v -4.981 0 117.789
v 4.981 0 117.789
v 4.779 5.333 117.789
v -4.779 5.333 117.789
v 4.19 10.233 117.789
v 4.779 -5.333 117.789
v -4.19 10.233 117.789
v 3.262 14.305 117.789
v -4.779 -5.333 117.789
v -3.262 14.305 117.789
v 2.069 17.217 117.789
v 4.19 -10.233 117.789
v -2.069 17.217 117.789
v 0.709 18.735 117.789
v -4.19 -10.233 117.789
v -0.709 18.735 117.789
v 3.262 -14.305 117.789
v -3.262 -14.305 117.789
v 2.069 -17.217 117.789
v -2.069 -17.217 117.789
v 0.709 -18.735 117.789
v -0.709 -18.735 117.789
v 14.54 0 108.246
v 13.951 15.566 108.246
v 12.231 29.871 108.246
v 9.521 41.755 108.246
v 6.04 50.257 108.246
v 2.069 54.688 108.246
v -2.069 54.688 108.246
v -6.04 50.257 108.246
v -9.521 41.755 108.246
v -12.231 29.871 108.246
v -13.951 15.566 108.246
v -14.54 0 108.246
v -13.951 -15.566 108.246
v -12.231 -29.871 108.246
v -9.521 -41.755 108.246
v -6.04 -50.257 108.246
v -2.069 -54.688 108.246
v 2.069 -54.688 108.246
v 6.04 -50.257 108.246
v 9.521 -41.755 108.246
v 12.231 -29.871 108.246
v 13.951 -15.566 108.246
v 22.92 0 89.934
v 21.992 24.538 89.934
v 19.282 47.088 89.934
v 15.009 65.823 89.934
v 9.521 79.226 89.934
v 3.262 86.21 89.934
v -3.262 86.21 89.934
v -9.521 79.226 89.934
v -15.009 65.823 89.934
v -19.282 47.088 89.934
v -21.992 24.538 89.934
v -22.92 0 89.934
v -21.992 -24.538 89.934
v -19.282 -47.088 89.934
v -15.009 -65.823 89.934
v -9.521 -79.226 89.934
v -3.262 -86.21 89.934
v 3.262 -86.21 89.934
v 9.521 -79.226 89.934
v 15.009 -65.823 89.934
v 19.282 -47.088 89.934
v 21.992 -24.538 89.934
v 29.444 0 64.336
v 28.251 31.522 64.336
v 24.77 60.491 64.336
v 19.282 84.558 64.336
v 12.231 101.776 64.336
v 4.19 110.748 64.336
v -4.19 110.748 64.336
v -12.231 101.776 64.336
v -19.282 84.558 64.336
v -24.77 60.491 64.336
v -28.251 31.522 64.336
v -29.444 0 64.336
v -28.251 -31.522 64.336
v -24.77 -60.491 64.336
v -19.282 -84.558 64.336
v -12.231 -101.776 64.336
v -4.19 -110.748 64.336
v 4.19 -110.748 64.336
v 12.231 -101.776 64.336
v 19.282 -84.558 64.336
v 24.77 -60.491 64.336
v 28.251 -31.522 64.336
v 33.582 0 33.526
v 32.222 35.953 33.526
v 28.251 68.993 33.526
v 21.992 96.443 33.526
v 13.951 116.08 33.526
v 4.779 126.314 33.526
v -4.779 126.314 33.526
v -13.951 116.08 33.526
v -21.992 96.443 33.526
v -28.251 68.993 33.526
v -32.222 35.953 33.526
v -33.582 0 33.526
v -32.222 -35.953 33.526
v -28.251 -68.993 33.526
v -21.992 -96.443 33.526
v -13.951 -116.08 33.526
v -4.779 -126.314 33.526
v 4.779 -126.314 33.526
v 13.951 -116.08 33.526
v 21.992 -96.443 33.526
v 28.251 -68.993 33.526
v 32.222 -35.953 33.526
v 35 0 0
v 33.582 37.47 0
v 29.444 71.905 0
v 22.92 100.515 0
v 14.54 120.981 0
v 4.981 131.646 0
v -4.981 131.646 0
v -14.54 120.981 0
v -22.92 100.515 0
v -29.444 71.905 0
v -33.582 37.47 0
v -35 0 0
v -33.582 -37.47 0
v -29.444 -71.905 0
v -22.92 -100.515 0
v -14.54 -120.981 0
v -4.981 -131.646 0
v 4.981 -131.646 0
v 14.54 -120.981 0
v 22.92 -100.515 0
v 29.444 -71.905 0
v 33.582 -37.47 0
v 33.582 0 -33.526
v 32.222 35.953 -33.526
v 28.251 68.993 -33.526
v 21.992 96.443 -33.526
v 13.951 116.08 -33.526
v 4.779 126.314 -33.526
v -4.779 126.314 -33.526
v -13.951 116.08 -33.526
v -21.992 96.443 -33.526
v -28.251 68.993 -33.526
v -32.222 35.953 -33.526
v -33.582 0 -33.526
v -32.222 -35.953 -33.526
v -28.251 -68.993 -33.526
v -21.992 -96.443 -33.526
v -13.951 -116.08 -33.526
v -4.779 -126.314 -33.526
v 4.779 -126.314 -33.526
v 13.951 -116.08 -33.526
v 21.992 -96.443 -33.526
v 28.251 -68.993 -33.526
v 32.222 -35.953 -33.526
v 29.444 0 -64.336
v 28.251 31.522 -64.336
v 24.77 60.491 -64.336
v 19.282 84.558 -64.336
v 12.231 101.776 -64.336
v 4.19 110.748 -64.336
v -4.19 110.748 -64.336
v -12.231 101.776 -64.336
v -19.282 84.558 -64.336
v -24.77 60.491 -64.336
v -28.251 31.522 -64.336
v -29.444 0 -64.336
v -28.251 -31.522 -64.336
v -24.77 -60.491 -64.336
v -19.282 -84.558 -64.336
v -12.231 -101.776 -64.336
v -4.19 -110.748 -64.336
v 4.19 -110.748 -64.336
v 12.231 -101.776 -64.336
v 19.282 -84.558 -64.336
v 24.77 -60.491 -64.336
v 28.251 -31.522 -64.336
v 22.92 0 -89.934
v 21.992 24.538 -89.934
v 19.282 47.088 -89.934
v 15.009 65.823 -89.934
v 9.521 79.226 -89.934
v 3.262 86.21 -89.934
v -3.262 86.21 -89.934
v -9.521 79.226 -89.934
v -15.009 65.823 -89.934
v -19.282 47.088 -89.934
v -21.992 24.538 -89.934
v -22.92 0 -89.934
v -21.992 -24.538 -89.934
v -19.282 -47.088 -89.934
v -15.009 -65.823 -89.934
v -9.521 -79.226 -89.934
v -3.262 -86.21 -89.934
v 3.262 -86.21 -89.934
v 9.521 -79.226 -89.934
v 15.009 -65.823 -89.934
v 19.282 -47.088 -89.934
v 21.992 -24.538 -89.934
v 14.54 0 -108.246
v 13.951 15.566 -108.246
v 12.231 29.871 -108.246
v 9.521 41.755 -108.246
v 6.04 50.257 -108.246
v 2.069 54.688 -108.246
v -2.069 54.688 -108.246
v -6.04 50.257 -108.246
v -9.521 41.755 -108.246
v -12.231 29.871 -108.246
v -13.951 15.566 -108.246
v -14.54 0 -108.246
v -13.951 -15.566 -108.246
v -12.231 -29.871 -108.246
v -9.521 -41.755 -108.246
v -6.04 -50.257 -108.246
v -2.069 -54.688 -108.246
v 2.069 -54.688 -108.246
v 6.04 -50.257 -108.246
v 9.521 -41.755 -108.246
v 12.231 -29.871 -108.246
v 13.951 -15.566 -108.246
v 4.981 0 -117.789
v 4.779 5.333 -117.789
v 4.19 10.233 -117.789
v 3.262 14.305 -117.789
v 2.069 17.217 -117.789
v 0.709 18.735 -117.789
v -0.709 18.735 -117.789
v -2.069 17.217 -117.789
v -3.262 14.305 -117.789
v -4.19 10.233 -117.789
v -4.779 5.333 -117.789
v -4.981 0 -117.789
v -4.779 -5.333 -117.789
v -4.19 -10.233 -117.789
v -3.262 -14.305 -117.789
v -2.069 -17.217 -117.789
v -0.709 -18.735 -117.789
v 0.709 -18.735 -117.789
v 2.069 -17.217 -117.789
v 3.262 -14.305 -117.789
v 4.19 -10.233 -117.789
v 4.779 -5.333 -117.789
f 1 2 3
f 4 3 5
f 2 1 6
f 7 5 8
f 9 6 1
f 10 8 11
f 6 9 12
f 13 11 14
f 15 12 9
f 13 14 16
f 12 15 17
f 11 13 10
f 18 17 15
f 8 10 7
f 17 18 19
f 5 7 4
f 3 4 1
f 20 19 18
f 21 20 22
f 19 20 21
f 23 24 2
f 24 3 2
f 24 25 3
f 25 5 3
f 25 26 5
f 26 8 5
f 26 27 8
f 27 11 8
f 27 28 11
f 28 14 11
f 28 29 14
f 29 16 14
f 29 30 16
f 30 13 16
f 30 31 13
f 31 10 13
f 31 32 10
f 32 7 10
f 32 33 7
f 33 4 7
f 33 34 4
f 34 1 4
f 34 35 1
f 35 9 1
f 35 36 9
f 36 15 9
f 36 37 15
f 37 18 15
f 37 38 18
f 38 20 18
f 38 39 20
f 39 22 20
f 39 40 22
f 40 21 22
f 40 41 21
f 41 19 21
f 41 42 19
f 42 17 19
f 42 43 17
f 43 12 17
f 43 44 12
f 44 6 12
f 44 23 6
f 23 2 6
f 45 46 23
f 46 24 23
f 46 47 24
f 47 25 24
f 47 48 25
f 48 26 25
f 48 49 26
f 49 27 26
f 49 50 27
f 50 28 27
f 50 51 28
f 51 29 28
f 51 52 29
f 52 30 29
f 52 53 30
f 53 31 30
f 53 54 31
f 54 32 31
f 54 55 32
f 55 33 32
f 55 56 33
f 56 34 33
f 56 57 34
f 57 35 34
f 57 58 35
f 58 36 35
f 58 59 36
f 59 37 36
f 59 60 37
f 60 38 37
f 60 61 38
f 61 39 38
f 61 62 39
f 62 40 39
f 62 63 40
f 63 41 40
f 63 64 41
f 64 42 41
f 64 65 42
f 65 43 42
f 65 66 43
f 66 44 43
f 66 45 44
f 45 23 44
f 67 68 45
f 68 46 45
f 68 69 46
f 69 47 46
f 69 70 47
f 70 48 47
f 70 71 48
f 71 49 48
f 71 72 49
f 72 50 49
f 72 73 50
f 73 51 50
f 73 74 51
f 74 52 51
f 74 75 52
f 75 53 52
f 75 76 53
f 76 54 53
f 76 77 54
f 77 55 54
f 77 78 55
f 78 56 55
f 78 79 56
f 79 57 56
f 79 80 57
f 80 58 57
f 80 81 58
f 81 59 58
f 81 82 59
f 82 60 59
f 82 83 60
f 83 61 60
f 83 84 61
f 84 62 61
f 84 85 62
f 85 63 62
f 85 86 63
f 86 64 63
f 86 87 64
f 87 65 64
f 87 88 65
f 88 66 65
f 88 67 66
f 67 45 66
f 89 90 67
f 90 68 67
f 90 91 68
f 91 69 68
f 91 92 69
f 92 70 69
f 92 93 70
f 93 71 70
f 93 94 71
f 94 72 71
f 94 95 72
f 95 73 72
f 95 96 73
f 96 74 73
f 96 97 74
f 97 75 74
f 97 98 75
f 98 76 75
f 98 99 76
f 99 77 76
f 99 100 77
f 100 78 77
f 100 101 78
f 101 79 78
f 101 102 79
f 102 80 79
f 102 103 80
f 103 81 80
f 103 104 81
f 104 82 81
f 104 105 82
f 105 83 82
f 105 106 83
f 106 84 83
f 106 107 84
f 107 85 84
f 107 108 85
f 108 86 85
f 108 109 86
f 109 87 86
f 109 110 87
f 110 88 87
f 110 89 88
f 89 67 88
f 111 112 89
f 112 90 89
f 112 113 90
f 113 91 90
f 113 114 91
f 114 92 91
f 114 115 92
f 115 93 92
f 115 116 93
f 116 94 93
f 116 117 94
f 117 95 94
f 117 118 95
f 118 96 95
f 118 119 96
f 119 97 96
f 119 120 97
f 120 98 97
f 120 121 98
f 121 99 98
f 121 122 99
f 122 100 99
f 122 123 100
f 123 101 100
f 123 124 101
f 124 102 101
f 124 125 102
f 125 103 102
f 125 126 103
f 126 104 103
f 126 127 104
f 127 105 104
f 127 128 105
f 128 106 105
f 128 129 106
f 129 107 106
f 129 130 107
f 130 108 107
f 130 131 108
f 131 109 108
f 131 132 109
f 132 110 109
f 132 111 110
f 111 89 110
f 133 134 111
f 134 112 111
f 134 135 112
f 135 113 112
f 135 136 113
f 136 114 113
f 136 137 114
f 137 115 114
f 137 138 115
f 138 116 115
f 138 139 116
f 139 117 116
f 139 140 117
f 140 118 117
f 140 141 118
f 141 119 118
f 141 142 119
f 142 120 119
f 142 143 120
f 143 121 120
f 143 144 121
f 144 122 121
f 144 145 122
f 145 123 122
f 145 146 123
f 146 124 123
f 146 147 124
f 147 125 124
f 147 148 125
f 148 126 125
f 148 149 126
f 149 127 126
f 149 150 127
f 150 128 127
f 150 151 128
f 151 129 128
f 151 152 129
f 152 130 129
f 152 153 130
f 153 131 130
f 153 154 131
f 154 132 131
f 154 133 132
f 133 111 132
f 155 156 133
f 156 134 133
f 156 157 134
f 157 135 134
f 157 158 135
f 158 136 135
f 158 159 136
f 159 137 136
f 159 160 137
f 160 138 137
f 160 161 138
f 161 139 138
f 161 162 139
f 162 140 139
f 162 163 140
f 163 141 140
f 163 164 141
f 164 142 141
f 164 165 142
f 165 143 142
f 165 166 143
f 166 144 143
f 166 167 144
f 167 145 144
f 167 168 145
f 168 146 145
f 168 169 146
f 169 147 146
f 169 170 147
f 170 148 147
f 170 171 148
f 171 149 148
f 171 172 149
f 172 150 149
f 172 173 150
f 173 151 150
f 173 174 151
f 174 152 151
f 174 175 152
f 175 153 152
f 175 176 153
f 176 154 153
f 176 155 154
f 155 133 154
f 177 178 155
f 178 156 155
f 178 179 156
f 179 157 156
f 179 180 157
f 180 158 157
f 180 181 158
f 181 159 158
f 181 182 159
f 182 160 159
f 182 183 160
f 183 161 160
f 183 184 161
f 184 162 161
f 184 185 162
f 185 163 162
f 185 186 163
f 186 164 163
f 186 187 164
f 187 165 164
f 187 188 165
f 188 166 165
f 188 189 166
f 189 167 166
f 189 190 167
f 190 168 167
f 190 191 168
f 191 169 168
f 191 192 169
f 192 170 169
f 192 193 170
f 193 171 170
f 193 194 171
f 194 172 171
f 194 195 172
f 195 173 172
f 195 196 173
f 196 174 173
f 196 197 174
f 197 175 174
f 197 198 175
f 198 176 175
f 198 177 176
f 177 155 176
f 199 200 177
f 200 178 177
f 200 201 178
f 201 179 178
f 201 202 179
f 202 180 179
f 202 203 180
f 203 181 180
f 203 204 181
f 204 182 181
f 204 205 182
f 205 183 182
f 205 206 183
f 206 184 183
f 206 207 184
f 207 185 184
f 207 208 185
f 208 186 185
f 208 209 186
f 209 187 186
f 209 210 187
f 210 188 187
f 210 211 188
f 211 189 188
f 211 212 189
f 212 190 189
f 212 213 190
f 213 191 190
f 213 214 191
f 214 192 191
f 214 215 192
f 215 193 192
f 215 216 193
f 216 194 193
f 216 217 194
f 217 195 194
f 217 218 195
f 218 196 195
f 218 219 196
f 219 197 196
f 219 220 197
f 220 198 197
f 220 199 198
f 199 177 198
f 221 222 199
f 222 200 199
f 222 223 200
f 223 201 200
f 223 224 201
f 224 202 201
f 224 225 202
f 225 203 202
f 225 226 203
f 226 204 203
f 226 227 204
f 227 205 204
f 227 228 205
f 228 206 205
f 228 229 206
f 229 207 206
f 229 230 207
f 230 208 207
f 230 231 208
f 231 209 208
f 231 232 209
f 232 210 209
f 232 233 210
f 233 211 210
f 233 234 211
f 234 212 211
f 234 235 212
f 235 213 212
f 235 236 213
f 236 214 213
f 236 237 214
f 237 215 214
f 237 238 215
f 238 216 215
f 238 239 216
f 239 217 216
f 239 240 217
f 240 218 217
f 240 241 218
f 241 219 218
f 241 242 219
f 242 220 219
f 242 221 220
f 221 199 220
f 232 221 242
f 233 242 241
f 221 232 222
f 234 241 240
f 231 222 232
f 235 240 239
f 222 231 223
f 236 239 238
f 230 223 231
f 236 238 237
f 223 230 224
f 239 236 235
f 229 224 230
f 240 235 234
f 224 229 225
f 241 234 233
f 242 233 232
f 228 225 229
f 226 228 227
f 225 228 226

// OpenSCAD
// Generated by SolidPython 1.0.1 on 2020-07-29 00:46:47


scale(v = [5, 19, 17]) {
	sphere(r = 7);
}
/***********************************************
*********      SolidPython code:      **********
************************************************
 
# import packages: SolidPython
from solid import *
from solid.utils import *
from itertools import chain, combinations, permutations


class Resize:

    def __init__(self, scad_file):
        self.scad_file = scad_file
        #self.scad_file = import_scad(scad_file)
        # cone/cylinder param:
        self.r1 = 0
        self.r2 = 0
        self.h = 0
        # rectangular prism param:
        self.w = 0
        self.l = 0
        # ellipse param:
        self.r = 0

    # import OpenScad code (file name corresponds to shape)


    # classify shape + parameters
    def assign(self, param1, param2, param3):
        if self.scad_file == 'cone.scad':
            self.r1 = param1
            self.r2 = param2
            self.h = param3
        elif self.scad_file == 'cylinder.scad':
            self.r1 = param1
            self.r2 = param2
            self.h = param3
        elif self.scad_file == 'rectangularPrism.scad':
            self.h = param1
            self.l = param2
            self.w = param3
        else:
            self.r = param1
            self.h = param2

    # resize parameters
    def iterate(self):
        x = range(3, 20, 2)
        i = 1
        if self.scad_file == 'cone.scad':
            tempList = list(permutations(x, 2))
            for temp in tempList:
                param1 = temp[0]
                param2 = temp[1]
                filepath = 'produced_scad_files/' + 'cone' + str(param1) + '_' + str(param2) + '_' + '.scad'
                scad_render_to_file(cylinder(h=param1, r1=param2, r2=0), filepath)

        elif self.scad_file == 'cylinder.scad':
            tempList = list(permutations(x, 3))
            for temp in tempList:
                param1 = temp[0]
                param2 = temp[1]
                filepath = 'produced_scad_files/' + 'cylinder' + str(param1) + '_' + str(param2) + '_' + '.scad'
                scad_render_to_file(cylinder(h=param1, r1=param2, r2=param2), filepath)

        elif self.scad_file == 'rectangularPrism.scad':
            tempList = list(permutations(x, 3))
            for temp in tempList:
                param1 = temp[0]
                param2 = temp[1]
                param3 = temp[2]
                filepath = 'produced_scad_files/' + 'rectangularPrism' + str(param1) + '_' + str(param2) + '_' + str(
                    param3) + '.scad'
                scad_render_to_file(cube(size=(param1, param2, param3)), filepath)

        elif self.scad_file == 'ellipse.scad':
            tempList = list(permutations(x, 4))
            for temp in tempList:
                param1 = temp[0]
                param2 = temp[1]
                param3 = temp[2]
                param4 = temp[3]
                filepath = 'produced_scad_files/' + 'ellipse' + str(param1) + '_' + str(param2) + '_' + str(param3) + '_' + str(param4) + '.scad'
                scad_render_to_file(scale([param1, param2, param3])(sphere(r=param4)), filepath)

    def render_to_scadfile(self):
        scad_render_to_file(scad, 'example.scad') 
 
************************************************/
